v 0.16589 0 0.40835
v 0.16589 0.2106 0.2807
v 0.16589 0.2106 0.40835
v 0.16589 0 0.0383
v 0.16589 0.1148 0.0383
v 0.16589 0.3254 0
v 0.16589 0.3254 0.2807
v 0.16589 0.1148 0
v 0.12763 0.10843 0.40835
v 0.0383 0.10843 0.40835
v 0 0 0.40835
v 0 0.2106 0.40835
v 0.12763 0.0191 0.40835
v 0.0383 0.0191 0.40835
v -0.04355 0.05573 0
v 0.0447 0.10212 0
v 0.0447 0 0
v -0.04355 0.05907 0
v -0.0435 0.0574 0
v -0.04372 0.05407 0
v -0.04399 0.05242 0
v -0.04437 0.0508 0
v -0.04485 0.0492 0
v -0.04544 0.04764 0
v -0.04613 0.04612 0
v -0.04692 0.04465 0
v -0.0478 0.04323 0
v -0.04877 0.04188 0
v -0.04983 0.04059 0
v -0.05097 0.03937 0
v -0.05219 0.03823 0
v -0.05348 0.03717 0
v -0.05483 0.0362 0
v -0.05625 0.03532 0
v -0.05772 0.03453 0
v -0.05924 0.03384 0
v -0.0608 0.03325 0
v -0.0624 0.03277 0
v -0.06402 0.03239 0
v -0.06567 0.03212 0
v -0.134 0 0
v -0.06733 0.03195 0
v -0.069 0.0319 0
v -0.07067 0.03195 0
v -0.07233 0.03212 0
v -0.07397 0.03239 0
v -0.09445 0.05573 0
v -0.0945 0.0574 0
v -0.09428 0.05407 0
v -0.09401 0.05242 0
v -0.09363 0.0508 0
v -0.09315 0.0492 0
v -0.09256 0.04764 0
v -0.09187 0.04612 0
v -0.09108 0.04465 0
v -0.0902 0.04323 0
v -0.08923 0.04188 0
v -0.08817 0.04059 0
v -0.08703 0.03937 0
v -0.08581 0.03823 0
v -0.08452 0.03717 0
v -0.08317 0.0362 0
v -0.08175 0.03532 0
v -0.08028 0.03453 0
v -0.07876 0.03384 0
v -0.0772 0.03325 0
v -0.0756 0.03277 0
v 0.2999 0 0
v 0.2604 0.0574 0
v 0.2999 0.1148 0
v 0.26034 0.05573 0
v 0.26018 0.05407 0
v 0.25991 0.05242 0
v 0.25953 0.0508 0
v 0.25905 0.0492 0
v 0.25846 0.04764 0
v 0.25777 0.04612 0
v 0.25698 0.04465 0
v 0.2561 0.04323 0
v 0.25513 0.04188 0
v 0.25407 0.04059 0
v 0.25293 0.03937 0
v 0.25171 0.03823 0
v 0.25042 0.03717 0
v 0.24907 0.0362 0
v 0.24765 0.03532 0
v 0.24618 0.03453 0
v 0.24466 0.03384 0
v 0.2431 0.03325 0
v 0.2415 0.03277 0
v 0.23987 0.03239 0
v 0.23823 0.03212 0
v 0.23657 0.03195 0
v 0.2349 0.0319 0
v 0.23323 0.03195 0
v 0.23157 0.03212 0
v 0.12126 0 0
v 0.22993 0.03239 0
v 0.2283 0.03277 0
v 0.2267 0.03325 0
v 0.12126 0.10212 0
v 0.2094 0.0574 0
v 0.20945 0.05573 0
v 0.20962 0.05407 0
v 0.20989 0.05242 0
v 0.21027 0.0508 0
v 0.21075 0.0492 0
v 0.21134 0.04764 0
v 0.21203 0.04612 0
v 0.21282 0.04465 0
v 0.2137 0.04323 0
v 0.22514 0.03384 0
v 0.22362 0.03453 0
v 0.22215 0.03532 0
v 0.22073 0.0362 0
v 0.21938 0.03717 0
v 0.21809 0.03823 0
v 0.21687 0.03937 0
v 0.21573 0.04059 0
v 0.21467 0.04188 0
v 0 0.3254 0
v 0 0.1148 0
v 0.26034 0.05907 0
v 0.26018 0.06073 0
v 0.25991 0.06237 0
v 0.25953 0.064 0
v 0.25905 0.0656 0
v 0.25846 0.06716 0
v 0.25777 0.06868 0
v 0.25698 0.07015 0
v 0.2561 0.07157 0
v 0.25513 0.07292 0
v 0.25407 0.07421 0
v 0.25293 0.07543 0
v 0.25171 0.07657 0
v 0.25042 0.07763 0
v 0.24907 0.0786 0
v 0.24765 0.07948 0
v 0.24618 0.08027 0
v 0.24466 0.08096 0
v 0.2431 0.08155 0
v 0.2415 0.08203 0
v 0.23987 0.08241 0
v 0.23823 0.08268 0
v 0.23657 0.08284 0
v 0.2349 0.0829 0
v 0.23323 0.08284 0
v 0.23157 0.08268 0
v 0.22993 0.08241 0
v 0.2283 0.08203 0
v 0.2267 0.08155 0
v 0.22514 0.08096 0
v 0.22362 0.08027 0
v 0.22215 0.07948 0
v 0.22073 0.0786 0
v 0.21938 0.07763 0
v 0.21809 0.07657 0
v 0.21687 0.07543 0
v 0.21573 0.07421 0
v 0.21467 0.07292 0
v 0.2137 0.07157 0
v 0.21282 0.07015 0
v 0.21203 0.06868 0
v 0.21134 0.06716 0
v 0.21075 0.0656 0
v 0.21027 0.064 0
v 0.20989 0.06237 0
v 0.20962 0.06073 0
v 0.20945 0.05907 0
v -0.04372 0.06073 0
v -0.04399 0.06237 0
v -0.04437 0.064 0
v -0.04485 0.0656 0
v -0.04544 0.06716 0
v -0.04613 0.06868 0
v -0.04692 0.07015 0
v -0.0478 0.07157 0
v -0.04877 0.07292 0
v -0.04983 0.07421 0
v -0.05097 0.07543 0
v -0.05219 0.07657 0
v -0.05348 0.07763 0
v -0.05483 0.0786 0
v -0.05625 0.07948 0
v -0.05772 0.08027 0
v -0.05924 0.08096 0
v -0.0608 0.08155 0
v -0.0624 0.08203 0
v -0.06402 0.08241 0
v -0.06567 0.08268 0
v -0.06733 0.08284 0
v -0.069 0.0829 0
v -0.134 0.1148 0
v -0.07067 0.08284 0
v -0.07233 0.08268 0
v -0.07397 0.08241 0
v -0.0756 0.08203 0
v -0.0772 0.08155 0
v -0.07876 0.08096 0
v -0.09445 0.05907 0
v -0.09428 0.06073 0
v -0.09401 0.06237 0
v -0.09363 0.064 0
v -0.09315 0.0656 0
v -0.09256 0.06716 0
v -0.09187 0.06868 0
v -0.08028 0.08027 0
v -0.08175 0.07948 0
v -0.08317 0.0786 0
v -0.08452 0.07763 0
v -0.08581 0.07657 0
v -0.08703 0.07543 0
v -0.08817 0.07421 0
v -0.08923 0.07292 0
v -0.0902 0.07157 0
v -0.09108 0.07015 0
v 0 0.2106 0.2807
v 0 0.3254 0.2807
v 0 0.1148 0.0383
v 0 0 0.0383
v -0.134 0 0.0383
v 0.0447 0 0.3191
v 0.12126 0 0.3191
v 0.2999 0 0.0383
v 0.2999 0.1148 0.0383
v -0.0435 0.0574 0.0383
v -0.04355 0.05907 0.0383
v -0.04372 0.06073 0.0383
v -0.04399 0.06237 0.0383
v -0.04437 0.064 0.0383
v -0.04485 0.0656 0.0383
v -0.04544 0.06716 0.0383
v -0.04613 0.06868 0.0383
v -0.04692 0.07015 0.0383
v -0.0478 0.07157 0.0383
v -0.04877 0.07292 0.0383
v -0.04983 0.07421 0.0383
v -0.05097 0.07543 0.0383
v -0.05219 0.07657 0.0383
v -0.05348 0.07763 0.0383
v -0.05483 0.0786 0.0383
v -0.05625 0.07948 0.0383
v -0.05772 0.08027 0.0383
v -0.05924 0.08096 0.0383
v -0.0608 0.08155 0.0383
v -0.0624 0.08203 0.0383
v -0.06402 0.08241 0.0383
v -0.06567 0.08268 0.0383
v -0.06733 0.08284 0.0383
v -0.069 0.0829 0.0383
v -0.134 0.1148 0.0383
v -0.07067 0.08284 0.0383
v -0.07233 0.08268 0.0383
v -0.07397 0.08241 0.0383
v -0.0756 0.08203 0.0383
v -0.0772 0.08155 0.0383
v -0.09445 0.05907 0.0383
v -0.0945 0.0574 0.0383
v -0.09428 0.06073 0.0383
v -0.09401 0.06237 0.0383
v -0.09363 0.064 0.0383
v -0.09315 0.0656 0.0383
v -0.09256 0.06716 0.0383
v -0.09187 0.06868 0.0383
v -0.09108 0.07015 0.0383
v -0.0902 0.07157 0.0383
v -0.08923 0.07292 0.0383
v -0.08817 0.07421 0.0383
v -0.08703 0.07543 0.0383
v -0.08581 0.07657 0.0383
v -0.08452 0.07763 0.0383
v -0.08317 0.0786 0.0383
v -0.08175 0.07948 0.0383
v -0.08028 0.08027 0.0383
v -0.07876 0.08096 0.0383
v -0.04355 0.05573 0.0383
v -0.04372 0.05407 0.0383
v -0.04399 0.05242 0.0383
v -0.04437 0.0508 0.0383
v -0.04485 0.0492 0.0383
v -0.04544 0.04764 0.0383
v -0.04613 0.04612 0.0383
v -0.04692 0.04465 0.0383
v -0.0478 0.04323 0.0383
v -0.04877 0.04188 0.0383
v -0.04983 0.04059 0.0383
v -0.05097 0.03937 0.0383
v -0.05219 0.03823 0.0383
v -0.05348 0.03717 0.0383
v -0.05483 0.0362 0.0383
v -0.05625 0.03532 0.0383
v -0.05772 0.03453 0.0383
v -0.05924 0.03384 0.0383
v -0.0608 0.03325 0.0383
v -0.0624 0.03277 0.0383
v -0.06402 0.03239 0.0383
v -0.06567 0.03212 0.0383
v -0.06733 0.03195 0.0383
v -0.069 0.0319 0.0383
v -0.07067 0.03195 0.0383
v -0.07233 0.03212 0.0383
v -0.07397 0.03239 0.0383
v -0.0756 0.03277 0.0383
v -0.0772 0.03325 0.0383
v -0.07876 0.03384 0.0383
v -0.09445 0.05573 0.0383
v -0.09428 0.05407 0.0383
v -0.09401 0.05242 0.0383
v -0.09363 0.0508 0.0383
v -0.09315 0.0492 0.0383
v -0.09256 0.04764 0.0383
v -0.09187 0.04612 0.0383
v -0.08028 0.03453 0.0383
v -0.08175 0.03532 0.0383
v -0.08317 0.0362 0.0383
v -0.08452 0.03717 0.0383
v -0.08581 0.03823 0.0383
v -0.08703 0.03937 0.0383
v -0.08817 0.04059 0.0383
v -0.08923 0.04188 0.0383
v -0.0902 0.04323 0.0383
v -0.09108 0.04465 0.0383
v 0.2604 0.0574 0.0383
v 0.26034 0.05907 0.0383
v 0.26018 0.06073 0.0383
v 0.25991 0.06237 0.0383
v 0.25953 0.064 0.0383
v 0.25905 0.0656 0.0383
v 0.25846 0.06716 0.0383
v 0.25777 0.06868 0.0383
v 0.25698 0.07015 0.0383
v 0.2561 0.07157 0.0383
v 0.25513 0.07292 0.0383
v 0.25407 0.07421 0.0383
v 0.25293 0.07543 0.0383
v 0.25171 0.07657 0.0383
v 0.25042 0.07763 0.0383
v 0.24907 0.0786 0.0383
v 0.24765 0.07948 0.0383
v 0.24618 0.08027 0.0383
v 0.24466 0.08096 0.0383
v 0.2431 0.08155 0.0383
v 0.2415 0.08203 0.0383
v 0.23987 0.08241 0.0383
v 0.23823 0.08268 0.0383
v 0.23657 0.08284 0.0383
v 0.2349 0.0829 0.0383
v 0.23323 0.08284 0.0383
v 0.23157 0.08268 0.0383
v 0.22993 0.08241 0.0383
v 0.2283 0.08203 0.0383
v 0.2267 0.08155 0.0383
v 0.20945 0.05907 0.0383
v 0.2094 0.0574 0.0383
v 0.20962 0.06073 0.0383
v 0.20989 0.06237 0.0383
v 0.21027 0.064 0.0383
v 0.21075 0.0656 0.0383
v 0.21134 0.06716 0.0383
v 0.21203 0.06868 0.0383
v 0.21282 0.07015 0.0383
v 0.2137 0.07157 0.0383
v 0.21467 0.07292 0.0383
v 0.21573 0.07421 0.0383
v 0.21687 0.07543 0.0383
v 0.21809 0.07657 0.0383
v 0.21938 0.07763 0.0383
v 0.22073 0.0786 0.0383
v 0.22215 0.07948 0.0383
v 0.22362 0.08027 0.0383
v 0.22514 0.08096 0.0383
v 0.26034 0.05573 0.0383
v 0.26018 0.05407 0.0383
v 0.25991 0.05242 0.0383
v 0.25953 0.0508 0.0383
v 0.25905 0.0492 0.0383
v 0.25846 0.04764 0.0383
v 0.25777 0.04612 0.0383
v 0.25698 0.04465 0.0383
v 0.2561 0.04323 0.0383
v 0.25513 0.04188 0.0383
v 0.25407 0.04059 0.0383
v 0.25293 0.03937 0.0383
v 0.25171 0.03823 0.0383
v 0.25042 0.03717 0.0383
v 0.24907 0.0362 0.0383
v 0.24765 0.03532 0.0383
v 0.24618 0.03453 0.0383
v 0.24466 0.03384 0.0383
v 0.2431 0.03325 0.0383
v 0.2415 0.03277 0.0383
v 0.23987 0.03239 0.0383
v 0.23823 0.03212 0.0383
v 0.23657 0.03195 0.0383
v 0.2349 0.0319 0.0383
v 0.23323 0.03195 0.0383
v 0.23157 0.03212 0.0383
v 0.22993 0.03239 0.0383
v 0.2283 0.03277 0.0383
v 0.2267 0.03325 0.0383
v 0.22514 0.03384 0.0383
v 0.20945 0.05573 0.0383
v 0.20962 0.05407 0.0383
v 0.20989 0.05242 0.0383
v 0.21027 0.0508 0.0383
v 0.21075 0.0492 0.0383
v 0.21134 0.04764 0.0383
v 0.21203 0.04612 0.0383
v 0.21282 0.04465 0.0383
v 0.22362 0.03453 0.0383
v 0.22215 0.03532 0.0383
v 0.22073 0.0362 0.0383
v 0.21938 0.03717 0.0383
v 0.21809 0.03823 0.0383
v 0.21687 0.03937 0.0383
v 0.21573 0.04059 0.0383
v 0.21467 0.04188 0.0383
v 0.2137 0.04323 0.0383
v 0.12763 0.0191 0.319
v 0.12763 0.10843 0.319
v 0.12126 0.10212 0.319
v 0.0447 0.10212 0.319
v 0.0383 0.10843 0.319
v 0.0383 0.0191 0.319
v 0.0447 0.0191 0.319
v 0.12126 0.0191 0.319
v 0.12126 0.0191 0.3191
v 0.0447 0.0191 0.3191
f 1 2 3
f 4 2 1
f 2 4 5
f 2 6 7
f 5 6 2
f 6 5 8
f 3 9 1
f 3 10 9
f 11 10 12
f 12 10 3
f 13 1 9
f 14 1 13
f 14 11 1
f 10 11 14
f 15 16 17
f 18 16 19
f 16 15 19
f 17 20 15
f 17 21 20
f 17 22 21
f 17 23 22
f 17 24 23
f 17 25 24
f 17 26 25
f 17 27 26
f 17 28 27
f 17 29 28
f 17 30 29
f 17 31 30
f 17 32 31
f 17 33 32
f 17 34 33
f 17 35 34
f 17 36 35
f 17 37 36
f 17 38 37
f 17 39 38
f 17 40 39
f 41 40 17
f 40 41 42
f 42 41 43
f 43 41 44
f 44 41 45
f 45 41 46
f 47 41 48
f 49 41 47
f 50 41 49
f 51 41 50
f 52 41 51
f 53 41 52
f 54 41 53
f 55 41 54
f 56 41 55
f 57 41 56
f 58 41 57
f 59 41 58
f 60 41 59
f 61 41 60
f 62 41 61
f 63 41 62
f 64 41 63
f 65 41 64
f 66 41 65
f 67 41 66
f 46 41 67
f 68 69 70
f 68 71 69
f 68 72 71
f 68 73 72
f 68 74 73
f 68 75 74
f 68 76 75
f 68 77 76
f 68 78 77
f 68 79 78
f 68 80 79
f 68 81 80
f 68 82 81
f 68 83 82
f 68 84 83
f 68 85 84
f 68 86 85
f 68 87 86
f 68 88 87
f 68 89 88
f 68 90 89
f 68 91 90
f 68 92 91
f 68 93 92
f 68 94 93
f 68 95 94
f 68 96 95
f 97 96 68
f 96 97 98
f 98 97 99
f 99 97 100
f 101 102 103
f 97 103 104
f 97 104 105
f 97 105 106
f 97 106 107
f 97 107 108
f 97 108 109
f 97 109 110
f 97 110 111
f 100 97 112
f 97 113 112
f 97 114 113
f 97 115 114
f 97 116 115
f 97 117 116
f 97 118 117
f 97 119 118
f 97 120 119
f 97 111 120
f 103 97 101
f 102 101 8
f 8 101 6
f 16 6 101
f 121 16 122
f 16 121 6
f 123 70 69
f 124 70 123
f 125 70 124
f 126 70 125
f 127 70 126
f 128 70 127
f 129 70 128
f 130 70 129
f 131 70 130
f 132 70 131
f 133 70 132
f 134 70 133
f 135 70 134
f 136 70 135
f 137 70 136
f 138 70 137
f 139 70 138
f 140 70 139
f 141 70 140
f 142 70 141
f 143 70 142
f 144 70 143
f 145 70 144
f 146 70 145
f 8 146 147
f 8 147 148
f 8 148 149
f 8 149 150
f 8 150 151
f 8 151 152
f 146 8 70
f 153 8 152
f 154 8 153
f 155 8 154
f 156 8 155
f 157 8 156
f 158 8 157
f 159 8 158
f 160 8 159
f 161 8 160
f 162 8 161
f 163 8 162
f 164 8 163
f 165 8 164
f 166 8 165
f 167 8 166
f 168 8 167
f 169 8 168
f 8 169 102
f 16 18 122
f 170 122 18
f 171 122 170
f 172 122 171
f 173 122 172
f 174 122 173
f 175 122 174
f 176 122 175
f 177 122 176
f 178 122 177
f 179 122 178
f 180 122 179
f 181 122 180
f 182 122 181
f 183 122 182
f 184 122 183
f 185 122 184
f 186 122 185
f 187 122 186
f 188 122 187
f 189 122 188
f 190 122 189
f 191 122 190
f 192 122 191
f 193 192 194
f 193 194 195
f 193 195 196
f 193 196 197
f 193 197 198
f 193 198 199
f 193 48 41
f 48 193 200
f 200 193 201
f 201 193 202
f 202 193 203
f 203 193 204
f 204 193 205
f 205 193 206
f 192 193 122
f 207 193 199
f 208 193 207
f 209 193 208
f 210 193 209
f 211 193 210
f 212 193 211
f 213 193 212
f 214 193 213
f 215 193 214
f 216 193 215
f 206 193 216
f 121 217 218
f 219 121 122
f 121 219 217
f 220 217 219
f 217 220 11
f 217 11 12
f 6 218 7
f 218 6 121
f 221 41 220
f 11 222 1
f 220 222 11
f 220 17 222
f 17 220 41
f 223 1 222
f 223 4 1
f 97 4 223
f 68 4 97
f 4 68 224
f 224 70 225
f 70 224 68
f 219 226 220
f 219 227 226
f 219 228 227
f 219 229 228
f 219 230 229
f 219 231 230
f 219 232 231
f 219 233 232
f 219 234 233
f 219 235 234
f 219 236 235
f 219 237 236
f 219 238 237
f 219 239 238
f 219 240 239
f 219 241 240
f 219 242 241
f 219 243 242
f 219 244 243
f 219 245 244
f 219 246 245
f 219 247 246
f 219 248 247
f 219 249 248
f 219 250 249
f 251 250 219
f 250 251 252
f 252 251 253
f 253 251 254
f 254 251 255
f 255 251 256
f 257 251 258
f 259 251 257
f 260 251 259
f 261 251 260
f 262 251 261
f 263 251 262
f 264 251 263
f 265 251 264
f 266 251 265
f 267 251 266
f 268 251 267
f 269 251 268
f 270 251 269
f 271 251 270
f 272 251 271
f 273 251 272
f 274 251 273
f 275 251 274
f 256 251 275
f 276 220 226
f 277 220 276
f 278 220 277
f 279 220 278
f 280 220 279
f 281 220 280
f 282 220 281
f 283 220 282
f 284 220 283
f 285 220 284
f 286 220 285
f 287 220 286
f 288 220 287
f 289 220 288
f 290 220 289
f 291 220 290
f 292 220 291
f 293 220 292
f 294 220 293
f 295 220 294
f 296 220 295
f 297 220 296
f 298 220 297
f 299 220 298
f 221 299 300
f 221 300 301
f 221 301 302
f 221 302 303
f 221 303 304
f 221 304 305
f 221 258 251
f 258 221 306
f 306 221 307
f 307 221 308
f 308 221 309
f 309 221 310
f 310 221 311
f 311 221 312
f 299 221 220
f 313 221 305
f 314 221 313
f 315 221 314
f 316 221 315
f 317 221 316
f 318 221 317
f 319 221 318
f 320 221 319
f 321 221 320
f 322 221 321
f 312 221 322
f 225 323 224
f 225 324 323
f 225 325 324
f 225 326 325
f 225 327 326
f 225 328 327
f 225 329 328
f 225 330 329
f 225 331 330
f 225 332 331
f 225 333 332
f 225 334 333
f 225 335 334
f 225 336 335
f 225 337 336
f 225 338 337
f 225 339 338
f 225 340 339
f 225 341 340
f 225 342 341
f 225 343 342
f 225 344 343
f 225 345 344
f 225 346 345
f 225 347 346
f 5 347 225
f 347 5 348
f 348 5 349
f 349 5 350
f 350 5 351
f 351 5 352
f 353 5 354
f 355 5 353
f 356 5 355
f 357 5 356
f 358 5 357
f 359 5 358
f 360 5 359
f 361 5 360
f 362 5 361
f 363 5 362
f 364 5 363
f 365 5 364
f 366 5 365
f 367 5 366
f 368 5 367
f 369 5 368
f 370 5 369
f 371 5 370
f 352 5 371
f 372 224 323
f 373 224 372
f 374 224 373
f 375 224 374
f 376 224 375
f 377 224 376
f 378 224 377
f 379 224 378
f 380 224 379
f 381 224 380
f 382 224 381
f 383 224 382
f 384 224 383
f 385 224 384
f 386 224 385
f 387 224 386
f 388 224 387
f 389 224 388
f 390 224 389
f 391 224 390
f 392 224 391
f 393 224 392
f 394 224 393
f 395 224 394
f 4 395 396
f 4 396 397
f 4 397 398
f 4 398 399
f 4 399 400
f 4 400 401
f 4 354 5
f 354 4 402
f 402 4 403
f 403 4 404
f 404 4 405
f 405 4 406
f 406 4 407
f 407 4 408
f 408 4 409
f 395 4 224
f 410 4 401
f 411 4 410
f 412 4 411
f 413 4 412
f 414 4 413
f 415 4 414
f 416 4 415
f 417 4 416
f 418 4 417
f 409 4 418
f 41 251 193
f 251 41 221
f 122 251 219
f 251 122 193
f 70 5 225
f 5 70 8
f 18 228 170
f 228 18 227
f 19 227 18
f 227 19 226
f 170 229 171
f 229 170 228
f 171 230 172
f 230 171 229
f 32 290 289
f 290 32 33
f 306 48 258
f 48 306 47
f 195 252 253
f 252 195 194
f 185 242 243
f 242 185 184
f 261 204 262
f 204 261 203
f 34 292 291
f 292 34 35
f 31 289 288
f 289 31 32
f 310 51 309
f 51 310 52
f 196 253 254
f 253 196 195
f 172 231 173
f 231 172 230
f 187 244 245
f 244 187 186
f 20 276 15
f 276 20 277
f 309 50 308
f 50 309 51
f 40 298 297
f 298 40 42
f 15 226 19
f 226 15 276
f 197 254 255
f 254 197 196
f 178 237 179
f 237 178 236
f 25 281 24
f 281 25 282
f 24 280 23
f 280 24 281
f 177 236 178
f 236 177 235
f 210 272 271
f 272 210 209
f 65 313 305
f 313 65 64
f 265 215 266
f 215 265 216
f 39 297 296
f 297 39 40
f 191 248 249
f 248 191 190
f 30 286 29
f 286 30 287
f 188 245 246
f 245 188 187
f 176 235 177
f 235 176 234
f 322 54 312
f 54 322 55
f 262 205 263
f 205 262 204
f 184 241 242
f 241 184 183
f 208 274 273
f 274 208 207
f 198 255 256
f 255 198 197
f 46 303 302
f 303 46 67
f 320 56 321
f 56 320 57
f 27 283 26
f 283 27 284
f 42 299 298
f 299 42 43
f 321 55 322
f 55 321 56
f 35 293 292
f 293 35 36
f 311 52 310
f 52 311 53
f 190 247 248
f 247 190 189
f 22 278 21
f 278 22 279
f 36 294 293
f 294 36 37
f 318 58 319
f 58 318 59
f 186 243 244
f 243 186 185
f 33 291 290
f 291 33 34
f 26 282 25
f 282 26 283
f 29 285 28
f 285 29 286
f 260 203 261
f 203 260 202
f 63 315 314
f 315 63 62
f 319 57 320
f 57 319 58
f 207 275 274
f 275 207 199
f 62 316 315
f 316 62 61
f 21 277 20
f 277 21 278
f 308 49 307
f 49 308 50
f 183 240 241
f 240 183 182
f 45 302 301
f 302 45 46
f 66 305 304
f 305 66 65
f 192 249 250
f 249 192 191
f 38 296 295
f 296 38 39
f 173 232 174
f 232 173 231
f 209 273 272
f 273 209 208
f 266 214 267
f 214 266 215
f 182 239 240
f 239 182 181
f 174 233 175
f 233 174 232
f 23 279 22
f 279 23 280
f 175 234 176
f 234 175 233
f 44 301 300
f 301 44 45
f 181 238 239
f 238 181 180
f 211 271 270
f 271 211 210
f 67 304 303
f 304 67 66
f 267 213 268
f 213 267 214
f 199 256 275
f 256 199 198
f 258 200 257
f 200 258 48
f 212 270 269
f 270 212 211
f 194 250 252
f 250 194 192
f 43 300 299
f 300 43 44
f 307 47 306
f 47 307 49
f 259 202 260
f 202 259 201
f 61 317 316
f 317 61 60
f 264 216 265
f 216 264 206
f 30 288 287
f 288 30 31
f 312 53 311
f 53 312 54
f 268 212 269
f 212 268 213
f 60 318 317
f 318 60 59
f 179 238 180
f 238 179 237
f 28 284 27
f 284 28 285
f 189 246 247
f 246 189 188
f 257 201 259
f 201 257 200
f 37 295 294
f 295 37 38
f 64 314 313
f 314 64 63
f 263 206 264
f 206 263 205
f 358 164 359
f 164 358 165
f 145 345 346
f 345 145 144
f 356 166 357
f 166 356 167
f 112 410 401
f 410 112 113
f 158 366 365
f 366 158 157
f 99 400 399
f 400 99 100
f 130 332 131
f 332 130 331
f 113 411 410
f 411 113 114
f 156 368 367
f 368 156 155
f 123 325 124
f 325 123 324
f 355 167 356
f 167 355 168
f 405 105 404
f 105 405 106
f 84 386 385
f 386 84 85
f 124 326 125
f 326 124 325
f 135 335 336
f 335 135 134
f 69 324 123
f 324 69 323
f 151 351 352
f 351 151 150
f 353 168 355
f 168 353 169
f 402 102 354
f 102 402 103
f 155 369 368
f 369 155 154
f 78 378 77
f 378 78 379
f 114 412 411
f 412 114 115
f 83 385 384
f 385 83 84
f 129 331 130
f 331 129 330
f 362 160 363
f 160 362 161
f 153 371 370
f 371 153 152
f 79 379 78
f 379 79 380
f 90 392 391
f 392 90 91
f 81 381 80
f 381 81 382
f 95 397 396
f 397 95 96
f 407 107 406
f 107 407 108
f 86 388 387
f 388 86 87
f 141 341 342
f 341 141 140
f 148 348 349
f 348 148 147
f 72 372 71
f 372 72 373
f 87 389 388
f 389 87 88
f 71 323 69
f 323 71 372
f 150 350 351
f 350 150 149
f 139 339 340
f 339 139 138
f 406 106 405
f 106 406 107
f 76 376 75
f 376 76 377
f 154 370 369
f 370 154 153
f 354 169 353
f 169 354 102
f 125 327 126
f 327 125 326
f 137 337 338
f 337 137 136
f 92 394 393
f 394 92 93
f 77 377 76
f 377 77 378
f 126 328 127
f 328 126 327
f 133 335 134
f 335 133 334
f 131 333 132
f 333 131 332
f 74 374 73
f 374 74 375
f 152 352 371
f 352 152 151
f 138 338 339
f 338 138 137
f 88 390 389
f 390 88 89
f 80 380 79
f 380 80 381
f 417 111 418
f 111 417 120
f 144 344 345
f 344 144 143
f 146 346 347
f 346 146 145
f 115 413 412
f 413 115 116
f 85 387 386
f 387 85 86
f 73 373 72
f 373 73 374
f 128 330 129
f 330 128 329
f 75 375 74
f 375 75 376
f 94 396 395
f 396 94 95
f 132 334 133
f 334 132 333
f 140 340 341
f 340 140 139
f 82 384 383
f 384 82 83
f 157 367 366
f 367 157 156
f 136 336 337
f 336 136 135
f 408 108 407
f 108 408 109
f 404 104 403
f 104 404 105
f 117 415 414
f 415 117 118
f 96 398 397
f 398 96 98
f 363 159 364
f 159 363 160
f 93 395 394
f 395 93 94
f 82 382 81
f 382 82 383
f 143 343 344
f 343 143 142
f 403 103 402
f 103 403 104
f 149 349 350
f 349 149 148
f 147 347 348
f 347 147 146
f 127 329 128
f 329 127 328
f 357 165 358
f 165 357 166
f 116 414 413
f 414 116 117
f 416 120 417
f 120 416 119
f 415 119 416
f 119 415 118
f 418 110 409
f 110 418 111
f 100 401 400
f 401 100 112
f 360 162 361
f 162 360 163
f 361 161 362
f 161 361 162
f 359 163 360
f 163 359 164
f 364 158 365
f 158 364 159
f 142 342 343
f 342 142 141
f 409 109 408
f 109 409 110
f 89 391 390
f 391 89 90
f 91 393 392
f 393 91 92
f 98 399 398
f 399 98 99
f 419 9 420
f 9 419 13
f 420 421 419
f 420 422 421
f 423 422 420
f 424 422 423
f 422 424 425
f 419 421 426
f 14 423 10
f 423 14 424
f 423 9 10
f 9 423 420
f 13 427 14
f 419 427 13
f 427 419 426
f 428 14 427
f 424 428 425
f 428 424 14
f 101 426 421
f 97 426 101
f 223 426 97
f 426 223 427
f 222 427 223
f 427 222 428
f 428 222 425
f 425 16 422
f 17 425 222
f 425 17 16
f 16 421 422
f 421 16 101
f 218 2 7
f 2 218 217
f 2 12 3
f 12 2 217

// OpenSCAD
// Parameters
$fn = 96;
eps = 0.0001;

// Main base dimensions
main_length = 0.165891;
main_width  = 0.325401;
main_height = 0.408347;
main_nominal_top = 0.4083;

// Top square recess
recess_size_x = 0.089326;
recess_size_y = 0.089326;
recess_left_offset = 0.0383;
recess_front_offset = 0.0191;
recess_bottom_z = 0.319;

// Lower rectangular opening
lower_opening_x = 0.076565;
lower_opening_y = 0.132416;
lower_left_offset = 0.0447;
lower_front_offset = -0.0303;
lower_bottom_z = 0;
lower_top_z = 0.319;

// Upper rear step cut
step_front_remaining = 0.2106;
step_back_width = 0.114848;
step_bottom_z = 0.2807;
step_cut_depth = 0.1276;

// Shallow front base section
front_base_length = 0.4339;
front_base_width = 0.1148;
front_base_height = 0.0383;
front_base_left_projection = 0.134;

// Circular openings in shallow section
hole_radius = 0.0255;
hole_front_offset = 0.0574;
hole_x_positions = [-0.069, 0.2349];

// Helper: cube from minimum corner
module box_at(pos, size) {
    translate(pos)
        cube(size, center=false);
}

// Main rectangular base
module main_base() {
    box_at([0, 0, 0], [main_length, main_width, main_height]);
}

// Added shallow front base section
module shallow_front_base() {
    box_at(
        [-front_base_left_projection, 0, 0],
        [front_base_length, front_base_width, front_base_height]
    );
}

// Top square recess cutter
module top_square_recess_cut() {
    box_at(
        [recess_left_offset, recess_front_offset, recess_bottom_z],
        [recess_size_x, recess_size_y, main_height - recess_bottom_z + eps]
    );
}

// Lower rectangular opening cutter
module lower_rectangular_opening_cut() {
    box_at(
        [lower_left_offset, lower_front_offset, lower_bottom_z - eps],
        [lower_opening_x, lower_opening_y, lower_top_z - lower_bottom_z + 2*eps]
    );
}

// Upper rear step cutter
module upper_back_step_cut() {
    box_at(
        [-eps, step_front_remaining, step_bottom_z],
        [main_length + 2*eps, step_back_width + eps, step_cut_depth + 2*eps]
    );
}

// Vertical circular through-hole cutter for front base
module front_base_hole_cut(xpos) {
    translate([xpos, hole_front_offset, -eps])
        cylinder(h=front_base_height + 2*eps, r=hole_radius, center=false);
}

// Final model
difference() {
    union() {
        main_base();
        shallow_front_base();
    }

    // Recess from top face
    top_square_recess_cut();

    // Lower front opening
    lower_rectangular_opening_cut();

    // Rear high-to-low step
    upper_back_step_cut();

    // Through holes in shallow front base
    for (xpos = hole_x_positions)
        front_base_hole_cut(xpos);
}
